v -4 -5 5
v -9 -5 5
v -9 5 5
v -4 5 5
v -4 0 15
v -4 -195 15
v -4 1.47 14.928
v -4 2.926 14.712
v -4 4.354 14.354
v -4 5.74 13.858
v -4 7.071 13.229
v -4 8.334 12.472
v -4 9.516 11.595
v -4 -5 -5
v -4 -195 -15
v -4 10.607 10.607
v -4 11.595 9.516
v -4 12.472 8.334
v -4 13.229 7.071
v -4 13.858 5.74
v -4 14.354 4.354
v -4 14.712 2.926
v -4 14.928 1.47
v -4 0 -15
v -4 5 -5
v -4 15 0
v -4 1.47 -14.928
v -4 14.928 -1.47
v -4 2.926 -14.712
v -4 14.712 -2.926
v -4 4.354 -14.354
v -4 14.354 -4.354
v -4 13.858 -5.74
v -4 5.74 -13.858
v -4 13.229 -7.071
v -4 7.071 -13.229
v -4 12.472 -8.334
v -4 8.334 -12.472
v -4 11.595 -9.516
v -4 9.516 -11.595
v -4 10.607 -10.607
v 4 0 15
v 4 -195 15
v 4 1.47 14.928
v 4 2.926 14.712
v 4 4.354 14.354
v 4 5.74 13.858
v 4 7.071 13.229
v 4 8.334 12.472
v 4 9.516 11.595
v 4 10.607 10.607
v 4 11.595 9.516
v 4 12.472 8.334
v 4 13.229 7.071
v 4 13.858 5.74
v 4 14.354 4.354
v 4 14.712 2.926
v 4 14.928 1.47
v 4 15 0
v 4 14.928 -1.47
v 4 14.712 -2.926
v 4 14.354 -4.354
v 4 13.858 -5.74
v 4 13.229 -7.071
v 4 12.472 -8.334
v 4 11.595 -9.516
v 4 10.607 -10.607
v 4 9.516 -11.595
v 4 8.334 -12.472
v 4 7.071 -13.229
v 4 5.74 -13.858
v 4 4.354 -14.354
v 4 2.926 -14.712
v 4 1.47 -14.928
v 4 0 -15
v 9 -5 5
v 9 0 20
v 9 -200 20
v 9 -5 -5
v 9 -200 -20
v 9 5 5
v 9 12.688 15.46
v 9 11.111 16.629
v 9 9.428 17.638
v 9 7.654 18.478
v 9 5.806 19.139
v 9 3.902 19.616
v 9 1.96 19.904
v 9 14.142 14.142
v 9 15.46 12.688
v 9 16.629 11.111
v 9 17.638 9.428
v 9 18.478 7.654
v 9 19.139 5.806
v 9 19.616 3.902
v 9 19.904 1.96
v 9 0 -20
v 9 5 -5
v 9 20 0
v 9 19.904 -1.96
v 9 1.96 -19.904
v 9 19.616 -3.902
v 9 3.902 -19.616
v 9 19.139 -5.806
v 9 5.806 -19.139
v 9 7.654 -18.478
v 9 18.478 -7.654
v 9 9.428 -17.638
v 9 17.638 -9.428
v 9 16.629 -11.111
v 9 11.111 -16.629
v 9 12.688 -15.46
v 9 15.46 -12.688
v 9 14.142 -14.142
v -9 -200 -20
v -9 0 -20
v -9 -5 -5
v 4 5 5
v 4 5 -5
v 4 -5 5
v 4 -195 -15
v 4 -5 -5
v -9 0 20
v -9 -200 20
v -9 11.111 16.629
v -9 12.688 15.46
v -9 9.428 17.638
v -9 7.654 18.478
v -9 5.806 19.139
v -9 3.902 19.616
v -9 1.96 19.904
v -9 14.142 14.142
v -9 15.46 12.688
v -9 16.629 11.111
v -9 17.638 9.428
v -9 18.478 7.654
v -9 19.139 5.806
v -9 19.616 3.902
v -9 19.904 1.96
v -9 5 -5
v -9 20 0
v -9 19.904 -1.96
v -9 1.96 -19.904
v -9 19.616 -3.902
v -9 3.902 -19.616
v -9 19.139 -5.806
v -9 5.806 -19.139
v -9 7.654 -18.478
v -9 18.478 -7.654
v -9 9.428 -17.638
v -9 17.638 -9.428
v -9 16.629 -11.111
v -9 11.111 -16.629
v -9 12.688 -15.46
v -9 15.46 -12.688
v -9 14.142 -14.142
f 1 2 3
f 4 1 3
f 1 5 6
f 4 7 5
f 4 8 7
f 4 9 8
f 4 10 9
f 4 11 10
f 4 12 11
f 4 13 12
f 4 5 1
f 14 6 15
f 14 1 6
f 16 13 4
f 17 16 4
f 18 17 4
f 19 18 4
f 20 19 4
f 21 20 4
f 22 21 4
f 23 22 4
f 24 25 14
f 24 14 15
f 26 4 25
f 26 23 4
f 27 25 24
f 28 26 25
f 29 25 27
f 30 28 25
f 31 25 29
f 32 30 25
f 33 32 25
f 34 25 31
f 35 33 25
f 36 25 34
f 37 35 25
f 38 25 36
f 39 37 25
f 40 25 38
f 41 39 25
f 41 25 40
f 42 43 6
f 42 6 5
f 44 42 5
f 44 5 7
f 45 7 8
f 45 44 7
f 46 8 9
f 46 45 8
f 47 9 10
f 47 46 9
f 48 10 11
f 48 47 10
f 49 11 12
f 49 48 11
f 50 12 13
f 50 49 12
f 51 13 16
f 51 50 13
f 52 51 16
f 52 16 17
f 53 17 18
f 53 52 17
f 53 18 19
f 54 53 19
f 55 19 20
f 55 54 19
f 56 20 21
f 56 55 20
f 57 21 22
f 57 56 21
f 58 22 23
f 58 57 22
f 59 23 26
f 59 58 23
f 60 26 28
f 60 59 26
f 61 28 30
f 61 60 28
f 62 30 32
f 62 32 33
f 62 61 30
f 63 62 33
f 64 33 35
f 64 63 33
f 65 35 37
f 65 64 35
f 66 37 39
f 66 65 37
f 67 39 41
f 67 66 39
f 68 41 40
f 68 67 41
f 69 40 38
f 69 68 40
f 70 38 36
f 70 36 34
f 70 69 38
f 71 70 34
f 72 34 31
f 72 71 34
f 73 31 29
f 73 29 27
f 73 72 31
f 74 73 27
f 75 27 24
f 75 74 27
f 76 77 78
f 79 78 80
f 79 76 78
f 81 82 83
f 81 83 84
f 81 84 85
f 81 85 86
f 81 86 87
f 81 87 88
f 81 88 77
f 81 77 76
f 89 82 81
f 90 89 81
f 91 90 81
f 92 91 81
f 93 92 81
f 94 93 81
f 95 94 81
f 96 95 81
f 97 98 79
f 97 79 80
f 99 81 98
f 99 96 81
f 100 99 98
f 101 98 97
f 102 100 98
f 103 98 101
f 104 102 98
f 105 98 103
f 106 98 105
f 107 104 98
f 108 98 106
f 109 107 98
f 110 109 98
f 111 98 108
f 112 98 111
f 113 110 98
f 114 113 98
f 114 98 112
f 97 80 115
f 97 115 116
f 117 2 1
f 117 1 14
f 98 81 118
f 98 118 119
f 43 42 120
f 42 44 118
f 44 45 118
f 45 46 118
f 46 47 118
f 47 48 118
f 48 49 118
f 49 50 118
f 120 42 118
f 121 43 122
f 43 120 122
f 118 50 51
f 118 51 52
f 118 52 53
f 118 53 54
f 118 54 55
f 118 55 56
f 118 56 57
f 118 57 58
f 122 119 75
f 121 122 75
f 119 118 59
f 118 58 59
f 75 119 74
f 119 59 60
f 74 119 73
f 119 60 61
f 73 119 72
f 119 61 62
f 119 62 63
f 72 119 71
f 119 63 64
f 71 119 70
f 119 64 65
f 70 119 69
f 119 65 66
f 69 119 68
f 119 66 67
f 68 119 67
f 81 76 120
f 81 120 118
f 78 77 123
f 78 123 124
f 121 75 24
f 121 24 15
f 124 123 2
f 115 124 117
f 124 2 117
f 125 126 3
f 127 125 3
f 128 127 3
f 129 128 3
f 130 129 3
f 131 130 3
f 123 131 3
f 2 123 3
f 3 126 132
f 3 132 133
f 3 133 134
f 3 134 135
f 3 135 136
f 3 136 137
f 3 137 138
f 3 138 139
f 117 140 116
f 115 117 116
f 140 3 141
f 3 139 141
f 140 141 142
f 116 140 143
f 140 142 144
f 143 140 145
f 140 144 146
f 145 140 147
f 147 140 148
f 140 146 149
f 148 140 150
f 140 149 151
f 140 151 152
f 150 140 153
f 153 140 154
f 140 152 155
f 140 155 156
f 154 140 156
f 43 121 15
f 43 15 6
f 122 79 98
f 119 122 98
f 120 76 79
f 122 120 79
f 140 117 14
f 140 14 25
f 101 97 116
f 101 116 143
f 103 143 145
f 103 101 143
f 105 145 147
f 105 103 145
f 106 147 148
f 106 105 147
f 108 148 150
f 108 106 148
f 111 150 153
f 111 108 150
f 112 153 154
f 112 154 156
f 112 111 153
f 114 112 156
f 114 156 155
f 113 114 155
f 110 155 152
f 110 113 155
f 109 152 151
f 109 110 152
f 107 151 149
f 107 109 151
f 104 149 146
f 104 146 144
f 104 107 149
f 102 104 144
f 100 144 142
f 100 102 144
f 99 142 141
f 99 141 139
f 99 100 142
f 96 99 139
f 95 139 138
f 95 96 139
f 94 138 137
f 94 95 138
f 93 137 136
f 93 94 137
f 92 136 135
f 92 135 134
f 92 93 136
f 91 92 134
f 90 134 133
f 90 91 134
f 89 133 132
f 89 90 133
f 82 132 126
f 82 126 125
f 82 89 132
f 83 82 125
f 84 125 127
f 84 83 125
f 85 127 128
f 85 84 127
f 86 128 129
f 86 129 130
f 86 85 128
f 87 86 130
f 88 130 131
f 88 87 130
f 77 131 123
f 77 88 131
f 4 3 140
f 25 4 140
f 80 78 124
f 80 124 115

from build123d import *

# Parameters (mm, degrees)
BOSS_EXTRUDE1_START = -9
SKETCH2_W           = 10
SKETCH2_H           = 10
BOSS_EXTRUDE1_DEPTH = 5
BOSS_EXTRUDE2_START = -4
BOSS_EXTRUDE2_DEPTH = 4


with BuildPart() as part:
    # Sketch2 → Boss-Extrude1 (new body)
    with BuildSketch(Plane(origin=(0, 0, 0), x_dir=(0, 0, -1), z_dir=(1, 0, 0)).offset(BOSS_EXTRUDE1_START)):
        with BuildLine():
            Line((-20, 0), (-20, -200))
            Line((-20, -200), (20, -200))
            Line((20, -200), (20, 0))
            ThreePointArc((20, 0), (0, 20), (-20, 0))
        make_face()
        Rectangle(SKETCH2_W, SKETCH2_H, mode=Mode.SUBTRACT)
    extrude(amount=BOSS_EXTRUDE1_DEPTH)

    # Sketch2<6> → Boss-Extrude2 (add)
    with BuildSketch(Plane(origin=(0, 0, 0), x_dir=(0, 0, -1), z_dir=(1, 0, 0)).offset(BOSS_EXTRUDE2_START)):
        with BuildLine():
            Line((-20, 0), (-20, -200))
            Line((-20, -200), (20, -200))
            Line((20, -200), (20, 0))
            ThreePointArc((20, 0), (0, 20), (-20, 0))
        make_face()
        with BuildLine():
            Line((15, 0), (15, -195))
            Line((15, -195), (-15, -195))
            Line((-15, -195), (-15, 0))
            ThreePointArc((-15, 0), (0, 15), (15, 0))
        make_face(mode=Mode.SUBTRACT)
    extrude(amount=BOSS_EXTRUDE2_DEPTH)

    # Mirror1: part across plane


with BuildPart() as part_1:
    add(part.part)
    add(part.part.mirror(Plane(origin=(0, 0, 0), x_dir=(0, 0, 1), z_dir=(1, 0, 0))))


solid = part_1.part
